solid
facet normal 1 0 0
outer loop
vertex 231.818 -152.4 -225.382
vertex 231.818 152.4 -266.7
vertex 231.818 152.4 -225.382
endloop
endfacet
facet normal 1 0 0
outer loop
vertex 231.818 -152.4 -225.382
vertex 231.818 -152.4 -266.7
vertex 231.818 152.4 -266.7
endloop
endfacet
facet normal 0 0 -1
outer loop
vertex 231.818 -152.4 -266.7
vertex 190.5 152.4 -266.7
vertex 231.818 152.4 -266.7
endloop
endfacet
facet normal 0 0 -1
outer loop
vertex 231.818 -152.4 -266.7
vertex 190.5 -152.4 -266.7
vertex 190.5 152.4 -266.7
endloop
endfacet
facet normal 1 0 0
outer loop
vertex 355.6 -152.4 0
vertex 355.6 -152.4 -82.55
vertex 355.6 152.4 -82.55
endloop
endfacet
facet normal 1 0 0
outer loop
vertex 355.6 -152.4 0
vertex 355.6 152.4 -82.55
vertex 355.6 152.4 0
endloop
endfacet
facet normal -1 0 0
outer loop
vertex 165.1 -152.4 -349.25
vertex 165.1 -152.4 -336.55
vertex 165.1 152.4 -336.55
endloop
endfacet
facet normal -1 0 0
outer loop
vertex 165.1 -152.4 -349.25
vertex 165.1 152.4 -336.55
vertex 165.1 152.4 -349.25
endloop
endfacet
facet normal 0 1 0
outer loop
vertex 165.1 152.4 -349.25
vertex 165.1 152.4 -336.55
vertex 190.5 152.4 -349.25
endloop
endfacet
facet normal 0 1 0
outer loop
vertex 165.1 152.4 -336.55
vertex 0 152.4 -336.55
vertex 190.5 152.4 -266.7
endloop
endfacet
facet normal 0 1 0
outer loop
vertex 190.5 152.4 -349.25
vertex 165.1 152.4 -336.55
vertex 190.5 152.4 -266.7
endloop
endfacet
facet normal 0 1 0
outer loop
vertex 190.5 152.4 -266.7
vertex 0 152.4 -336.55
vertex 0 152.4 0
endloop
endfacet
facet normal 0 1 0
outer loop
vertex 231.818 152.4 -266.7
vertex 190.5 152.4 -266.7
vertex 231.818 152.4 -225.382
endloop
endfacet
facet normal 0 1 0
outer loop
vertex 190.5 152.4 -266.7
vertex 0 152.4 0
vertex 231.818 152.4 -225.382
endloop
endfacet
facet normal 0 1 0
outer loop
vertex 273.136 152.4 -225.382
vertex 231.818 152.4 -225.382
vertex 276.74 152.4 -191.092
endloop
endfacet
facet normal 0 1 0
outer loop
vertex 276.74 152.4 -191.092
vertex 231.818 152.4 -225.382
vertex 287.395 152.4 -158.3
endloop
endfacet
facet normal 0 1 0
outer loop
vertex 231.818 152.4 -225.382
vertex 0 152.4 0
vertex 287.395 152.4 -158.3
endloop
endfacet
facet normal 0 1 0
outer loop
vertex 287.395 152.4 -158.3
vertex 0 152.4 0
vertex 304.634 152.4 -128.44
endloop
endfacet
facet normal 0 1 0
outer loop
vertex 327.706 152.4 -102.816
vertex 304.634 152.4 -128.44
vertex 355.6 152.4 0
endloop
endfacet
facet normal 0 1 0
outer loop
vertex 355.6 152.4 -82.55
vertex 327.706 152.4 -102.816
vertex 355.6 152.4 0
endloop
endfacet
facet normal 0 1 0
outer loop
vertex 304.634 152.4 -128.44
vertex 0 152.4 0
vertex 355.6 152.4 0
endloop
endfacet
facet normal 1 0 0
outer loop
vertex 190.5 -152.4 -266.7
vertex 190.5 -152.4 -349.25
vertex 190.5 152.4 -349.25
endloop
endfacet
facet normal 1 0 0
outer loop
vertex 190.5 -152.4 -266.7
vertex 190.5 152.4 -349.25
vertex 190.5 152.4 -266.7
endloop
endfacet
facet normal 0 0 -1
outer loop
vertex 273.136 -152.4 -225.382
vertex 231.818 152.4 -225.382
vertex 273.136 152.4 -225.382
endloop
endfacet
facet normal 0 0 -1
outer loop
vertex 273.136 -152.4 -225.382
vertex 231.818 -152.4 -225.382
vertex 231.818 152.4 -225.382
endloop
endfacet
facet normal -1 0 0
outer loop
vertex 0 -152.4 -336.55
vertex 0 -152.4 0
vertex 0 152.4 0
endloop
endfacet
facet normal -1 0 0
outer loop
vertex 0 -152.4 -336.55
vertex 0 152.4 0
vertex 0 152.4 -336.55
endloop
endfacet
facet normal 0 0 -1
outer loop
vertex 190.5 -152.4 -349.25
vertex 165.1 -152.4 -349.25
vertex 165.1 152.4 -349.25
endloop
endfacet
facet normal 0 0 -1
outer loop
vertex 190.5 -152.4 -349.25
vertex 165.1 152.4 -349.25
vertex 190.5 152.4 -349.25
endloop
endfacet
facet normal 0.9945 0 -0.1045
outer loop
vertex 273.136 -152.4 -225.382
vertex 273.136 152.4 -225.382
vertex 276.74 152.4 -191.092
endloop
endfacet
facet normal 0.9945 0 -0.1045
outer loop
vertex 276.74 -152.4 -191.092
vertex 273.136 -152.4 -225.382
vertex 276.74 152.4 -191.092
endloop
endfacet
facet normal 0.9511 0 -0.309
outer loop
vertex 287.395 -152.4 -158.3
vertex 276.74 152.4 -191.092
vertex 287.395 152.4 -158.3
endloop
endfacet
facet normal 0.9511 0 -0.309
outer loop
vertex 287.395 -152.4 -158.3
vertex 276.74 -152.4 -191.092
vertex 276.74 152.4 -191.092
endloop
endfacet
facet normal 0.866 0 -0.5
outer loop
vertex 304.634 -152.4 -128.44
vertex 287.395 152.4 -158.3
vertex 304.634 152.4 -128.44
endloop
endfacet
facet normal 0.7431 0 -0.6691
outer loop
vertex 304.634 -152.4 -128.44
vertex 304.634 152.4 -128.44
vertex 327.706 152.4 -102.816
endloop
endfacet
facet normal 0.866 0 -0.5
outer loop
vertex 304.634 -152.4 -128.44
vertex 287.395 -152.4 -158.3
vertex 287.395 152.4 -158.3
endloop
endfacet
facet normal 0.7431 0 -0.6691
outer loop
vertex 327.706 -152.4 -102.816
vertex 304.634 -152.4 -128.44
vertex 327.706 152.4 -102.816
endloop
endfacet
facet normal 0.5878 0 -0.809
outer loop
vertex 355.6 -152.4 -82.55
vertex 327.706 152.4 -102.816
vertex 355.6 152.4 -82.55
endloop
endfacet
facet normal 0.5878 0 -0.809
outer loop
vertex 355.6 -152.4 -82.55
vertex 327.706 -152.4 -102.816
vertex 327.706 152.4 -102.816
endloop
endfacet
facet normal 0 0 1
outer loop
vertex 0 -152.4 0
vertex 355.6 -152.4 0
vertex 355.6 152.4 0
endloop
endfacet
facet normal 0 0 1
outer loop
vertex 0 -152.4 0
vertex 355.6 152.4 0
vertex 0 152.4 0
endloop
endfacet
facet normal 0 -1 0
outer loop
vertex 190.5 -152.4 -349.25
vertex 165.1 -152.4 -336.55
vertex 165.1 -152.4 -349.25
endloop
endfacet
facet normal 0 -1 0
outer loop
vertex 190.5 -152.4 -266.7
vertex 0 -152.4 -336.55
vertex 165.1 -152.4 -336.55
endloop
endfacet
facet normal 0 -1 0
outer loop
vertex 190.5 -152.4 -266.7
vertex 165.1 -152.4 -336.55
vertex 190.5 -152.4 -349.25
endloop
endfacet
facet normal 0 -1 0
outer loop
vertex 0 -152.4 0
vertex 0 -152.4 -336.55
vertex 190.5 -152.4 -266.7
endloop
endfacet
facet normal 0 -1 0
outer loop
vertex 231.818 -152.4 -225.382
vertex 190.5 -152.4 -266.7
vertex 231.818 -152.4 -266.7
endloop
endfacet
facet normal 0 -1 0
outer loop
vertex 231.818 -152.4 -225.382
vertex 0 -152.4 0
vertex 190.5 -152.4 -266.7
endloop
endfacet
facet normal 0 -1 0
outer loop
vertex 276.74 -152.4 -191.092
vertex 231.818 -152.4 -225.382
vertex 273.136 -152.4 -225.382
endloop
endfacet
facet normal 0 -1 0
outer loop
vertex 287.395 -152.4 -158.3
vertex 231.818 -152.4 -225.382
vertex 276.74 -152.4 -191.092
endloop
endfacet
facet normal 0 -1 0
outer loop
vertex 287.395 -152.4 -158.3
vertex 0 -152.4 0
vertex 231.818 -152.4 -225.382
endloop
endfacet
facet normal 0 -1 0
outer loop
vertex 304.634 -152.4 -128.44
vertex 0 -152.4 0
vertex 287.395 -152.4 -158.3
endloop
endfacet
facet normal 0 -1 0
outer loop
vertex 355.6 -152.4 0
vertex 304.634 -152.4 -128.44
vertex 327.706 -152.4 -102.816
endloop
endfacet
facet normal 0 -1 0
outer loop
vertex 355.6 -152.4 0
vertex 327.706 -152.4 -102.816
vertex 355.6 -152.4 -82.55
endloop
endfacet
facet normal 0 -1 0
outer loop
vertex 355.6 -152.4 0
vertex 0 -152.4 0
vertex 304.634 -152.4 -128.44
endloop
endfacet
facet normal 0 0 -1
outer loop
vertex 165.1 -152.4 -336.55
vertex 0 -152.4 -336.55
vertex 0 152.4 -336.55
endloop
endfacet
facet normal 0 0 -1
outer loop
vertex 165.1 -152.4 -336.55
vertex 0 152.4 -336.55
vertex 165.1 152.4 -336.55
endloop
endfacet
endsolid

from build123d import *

# Parameters (mm, degrees)
F1_DEPTH = 152.4


with BuildPart() as f1:
    # F0 (on Front) → F1 (new body, symmetric)
    with BuildSketch(Plane.XZ):
        with BuildLine():
            Line((231.817934, -225.382066), (273.135868, -225.382066))
            ThreePointArc((273.135868, -225.382066), (295.232066, -142.917934), (355.6, -82.55))
            Line((355.6, -82.55), (355.6, 0))
            Line((355.6, 0), (0, 0))
            Line((0, 0), (0, -336.55))
            Line((0, -336.55), (165.1, -336.55))
            Line((165.1, -336.55), (165.1, -349.25))
            Line((165.1, -349.25), (190.5, -349.25))
            Line((190.5, -349.25), (190.5, -266.7))
            Line((190.5, -266.7), (231.817934, -266.7))
            Line((231.817934, -266.7), (231.817934, -225.382066))
        make_face()
    extrude(amount=F1_DEPTH, both=True)


solid = f1.part
